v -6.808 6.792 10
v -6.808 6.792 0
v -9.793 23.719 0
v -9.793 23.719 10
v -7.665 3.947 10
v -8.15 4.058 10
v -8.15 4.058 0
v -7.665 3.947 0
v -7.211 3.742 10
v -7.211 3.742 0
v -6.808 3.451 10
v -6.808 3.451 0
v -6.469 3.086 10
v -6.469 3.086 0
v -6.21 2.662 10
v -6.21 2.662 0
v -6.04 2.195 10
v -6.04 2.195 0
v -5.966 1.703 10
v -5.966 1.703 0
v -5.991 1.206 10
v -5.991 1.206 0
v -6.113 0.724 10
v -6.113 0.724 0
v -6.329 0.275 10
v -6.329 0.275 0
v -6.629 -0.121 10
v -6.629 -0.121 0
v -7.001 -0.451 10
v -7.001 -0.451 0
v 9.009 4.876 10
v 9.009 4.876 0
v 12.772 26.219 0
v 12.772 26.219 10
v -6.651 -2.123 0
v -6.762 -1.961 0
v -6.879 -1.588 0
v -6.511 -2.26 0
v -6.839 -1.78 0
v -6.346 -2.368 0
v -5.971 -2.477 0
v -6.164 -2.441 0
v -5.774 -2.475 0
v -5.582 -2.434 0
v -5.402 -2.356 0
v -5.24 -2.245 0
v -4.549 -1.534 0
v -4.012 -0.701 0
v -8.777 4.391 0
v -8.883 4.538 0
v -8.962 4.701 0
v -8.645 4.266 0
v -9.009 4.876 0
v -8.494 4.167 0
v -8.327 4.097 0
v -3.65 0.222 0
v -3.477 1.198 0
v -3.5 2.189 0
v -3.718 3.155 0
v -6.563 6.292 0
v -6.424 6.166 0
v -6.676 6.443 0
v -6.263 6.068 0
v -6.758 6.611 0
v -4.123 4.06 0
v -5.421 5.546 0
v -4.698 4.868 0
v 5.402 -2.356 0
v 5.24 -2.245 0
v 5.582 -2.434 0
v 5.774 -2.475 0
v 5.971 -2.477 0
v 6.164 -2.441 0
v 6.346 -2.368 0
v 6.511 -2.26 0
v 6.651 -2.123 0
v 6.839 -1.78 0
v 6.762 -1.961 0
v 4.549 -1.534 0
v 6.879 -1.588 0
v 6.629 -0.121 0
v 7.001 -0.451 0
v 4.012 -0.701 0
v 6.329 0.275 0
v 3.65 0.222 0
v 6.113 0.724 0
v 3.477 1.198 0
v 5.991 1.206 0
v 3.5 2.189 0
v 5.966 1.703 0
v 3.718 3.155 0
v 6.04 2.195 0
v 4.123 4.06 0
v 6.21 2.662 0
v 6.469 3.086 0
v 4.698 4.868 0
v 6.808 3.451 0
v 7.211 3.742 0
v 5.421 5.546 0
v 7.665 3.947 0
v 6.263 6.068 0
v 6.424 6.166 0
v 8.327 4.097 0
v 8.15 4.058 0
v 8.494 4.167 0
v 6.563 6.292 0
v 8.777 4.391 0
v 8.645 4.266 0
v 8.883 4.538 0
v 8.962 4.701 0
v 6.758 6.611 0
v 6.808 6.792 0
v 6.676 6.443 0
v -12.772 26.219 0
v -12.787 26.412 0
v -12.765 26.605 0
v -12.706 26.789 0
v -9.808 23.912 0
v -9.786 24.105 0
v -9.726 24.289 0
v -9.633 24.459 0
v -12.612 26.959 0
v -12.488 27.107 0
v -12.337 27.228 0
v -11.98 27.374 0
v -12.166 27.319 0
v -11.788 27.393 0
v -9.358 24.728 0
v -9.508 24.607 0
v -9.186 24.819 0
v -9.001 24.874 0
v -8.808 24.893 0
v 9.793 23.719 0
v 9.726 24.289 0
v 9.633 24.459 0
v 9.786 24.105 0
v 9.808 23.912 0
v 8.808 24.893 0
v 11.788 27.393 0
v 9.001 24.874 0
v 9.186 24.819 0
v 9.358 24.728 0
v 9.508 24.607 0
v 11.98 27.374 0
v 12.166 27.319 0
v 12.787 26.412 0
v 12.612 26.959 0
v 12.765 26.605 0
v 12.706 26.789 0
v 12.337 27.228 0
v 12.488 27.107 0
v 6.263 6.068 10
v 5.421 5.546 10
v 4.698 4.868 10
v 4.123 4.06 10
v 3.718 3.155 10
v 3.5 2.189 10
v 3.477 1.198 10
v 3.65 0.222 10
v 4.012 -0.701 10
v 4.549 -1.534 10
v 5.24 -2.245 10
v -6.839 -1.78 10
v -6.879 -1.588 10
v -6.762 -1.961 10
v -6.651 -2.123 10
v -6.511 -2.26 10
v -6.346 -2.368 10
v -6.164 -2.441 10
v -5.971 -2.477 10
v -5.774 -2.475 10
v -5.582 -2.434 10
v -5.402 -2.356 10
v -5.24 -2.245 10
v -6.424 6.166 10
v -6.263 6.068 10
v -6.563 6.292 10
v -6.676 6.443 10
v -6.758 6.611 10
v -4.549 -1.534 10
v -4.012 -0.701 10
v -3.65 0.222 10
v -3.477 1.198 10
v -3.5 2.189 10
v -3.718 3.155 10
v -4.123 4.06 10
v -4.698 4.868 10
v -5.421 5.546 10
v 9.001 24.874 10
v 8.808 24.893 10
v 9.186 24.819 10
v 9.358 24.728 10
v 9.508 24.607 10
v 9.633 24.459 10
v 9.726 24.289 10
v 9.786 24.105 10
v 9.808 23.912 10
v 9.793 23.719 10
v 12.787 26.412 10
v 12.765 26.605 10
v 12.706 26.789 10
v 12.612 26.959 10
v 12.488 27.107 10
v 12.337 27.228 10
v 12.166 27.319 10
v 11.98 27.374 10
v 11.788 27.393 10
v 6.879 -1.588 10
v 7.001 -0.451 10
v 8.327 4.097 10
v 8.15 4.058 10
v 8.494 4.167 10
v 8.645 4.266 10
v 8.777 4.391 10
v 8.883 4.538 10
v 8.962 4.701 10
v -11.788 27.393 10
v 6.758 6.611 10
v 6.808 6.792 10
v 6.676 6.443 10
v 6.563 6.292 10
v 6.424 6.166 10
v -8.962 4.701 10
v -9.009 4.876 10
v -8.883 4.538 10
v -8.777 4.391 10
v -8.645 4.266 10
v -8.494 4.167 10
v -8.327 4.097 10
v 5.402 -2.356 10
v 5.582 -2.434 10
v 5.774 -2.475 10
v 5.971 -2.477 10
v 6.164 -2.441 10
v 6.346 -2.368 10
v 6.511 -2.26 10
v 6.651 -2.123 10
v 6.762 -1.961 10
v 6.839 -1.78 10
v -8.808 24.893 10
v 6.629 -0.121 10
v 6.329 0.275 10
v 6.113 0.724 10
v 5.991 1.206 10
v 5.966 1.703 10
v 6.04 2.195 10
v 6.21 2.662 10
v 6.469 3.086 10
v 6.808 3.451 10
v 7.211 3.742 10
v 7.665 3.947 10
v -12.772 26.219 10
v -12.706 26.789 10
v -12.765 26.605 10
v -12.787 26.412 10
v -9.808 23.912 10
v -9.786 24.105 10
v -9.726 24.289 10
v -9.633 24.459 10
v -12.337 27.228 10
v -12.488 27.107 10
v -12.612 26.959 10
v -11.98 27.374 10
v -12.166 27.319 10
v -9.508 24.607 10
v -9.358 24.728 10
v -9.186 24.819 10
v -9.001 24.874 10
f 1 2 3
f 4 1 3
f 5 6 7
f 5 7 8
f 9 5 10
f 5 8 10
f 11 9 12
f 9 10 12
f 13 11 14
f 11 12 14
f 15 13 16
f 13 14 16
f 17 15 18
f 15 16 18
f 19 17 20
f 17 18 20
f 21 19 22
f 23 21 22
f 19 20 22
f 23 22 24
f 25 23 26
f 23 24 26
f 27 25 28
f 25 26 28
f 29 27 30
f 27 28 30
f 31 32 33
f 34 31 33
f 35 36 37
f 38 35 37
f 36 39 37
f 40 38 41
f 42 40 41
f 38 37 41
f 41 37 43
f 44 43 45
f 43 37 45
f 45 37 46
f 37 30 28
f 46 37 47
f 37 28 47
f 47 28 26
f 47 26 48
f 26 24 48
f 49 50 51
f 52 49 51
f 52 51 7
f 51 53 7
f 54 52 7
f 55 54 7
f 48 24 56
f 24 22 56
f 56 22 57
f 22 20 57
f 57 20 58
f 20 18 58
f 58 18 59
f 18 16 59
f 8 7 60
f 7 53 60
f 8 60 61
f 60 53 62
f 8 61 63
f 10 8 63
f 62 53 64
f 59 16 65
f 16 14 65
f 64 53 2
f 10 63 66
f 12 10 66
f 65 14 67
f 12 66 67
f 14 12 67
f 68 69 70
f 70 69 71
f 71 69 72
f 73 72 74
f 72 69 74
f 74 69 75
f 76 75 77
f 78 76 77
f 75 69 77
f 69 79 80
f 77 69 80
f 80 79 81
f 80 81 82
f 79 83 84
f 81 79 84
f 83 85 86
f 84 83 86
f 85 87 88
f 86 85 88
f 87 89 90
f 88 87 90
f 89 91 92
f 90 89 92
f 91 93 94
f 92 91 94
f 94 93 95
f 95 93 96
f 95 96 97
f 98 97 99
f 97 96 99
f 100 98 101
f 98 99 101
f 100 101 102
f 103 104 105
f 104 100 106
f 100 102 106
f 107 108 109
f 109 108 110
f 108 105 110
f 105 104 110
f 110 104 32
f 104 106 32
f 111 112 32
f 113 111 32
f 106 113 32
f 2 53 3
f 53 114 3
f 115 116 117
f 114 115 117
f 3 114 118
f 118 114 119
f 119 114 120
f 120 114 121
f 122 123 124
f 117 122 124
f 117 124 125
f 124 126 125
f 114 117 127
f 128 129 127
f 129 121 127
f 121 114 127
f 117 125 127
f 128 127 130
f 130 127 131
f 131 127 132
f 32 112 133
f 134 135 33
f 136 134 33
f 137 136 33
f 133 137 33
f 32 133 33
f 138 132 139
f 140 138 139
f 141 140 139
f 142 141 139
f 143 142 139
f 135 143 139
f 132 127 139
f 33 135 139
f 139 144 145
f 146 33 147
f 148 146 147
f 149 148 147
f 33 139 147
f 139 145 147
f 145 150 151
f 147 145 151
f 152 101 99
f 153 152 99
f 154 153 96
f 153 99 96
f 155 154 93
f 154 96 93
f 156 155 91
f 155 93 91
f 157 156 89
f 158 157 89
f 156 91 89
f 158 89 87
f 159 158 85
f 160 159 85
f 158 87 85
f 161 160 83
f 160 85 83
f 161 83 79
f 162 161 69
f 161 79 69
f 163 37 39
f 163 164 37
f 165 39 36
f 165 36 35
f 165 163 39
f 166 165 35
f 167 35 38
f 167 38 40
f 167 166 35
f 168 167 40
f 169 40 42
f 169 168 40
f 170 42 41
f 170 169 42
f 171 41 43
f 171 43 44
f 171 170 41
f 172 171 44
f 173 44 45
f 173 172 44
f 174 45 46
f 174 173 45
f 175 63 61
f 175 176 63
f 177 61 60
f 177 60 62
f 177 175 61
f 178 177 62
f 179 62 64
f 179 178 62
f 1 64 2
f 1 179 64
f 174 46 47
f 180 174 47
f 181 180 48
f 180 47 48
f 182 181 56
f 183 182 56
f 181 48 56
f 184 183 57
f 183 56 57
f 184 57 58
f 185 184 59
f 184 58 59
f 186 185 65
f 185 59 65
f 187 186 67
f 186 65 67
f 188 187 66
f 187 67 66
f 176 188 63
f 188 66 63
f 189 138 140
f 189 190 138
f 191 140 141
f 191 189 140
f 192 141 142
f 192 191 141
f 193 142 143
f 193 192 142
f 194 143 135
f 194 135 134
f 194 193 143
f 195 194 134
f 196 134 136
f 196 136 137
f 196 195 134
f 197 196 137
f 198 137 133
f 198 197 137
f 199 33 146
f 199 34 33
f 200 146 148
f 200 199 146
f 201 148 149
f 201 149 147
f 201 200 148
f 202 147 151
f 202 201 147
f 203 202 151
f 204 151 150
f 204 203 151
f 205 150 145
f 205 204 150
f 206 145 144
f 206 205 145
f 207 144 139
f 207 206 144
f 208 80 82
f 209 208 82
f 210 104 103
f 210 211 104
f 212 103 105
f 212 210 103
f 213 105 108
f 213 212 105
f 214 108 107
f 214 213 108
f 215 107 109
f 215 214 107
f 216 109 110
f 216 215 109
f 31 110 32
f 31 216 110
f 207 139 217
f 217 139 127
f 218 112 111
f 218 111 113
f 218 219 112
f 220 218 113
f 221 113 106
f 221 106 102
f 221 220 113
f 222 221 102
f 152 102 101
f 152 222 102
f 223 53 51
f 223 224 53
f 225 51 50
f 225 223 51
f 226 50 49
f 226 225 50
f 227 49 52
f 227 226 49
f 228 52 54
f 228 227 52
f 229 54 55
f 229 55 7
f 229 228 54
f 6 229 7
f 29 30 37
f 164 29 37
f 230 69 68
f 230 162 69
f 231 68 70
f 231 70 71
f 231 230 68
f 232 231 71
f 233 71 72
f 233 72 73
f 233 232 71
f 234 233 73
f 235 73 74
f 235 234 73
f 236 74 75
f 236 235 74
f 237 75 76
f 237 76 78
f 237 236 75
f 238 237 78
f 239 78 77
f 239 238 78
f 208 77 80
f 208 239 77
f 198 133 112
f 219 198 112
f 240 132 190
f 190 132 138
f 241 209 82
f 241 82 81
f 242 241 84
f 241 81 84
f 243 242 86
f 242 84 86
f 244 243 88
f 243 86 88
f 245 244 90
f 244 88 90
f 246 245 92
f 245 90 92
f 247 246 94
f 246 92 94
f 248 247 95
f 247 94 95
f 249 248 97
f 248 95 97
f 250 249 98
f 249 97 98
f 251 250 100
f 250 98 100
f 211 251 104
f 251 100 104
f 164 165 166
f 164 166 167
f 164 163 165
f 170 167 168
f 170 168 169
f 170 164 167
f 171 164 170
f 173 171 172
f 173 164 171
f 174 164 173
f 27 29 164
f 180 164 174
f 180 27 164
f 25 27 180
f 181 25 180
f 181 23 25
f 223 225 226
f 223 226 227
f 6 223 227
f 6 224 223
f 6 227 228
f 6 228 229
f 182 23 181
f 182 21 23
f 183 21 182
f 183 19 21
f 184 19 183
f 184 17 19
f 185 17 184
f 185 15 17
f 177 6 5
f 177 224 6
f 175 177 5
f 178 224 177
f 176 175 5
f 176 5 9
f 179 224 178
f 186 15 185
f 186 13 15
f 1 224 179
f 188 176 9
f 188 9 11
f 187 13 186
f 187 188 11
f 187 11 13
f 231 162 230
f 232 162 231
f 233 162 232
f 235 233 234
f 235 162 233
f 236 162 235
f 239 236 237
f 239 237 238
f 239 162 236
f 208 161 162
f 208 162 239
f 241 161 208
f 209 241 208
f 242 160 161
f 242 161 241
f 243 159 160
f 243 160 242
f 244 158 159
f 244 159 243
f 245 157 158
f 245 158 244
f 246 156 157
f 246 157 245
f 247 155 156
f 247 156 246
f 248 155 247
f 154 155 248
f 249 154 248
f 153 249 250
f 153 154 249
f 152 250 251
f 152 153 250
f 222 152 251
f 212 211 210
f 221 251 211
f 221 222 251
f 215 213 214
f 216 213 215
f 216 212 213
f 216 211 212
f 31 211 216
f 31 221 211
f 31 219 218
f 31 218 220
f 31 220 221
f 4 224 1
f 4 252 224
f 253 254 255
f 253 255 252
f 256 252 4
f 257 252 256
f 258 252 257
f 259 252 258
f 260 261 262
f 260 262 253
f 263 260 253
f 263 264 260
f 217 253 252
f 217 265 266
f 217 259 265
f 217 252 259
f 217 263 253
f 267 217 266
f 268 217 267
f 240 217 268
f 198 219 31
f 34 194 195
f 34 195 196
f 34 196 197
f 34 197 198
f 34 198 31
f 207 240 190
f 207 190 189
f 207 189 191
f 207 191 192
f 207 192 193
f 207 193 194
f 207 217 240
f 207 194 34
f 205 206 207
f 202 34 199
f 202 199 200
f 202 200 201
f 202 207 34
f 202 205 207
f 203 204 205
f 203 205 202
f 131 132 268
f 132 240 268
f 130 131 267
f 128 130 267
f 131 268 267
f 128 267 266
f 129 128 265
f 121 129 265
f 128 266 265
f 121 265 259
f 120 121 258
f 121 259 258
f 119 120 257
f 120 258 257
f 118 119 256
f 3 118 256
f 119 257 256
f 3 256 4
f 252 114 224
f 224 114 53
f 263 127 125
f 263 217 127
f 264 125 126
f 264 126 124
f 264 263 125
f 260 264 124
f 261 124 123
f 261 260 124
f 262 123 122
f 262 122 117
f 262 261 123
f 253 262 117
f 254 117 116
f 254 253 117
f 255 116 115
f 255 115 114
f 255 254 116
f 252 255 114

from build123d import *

# Parameters (mm, degrees)
F1_DEPTH = 10
F2_R     = 1


with BuildPart() as f1:
    # F0 (on Top) → F1 (new body)
    with BuildSketch(Plane.XY):
        with BuildLine():
            Line((-10, 24.893011), (0, 24.893011))
            Line((0, 24.893011), (10, 24.893011))
            Line((10, 24.893011), (6.71487, 6.262112))
            ThreePointArc((6.71487, 6.262112), (3.462721, 1.577561), (6.71487, -3.106989))
            Line((6.71487, -3.106989), (7.001372, -0.450851))
            ThreePointArc((7.001372, -0.450851), (6.152804, 2.533741), (8.862567, 4.045379))
            Line((8.862567, 4.045379), (12.979384, 27.393011))
            Line((12.979384, 27.393011), (0, 27.393011))
            Line((0, 27.393011), (-12.979384, 27.393011))
            Line((-12.979384, 27.393011), (-8.862567, 4.045379))
            ThreePointArc((-8.862567, 4.045379), (-6.152804, 2.533741), (-7.001372, -0.450851))
            Line((-7.001372, -0.450851), (-6.71487, -3.106989))
            ThreePointArc((-6.71487, -3.106989), (-3.462721, 1.577561), (-6.71487, 6.262112))
            Line((-6.71487, 6.262112), (-10, 24.893011))
        make_face()
    extrude(amount=F1_DEPTH)

    # F2
    f2_edges = [f1.edges().sort_by_distance(p)[0] for p in [
        (-6.71487, -3.106989, 5),
        (6.71487, -3.106989, 5),
        (-12.979384, 27.393011, 5),
        (12.979384, 27.393011, 5),
        (-10, 24.893011, 5),
        (10, 24.893011, 5),
        (-6.71487, 6.262112, 5),
        (6.71487, 6.262112, 5),
        (-8.862567, 4.045379, 5),
        (8.862567, 4.045379, 5),
    ]]
    fillet(f2_edges, radius=F2_R)


solid = f1.part
